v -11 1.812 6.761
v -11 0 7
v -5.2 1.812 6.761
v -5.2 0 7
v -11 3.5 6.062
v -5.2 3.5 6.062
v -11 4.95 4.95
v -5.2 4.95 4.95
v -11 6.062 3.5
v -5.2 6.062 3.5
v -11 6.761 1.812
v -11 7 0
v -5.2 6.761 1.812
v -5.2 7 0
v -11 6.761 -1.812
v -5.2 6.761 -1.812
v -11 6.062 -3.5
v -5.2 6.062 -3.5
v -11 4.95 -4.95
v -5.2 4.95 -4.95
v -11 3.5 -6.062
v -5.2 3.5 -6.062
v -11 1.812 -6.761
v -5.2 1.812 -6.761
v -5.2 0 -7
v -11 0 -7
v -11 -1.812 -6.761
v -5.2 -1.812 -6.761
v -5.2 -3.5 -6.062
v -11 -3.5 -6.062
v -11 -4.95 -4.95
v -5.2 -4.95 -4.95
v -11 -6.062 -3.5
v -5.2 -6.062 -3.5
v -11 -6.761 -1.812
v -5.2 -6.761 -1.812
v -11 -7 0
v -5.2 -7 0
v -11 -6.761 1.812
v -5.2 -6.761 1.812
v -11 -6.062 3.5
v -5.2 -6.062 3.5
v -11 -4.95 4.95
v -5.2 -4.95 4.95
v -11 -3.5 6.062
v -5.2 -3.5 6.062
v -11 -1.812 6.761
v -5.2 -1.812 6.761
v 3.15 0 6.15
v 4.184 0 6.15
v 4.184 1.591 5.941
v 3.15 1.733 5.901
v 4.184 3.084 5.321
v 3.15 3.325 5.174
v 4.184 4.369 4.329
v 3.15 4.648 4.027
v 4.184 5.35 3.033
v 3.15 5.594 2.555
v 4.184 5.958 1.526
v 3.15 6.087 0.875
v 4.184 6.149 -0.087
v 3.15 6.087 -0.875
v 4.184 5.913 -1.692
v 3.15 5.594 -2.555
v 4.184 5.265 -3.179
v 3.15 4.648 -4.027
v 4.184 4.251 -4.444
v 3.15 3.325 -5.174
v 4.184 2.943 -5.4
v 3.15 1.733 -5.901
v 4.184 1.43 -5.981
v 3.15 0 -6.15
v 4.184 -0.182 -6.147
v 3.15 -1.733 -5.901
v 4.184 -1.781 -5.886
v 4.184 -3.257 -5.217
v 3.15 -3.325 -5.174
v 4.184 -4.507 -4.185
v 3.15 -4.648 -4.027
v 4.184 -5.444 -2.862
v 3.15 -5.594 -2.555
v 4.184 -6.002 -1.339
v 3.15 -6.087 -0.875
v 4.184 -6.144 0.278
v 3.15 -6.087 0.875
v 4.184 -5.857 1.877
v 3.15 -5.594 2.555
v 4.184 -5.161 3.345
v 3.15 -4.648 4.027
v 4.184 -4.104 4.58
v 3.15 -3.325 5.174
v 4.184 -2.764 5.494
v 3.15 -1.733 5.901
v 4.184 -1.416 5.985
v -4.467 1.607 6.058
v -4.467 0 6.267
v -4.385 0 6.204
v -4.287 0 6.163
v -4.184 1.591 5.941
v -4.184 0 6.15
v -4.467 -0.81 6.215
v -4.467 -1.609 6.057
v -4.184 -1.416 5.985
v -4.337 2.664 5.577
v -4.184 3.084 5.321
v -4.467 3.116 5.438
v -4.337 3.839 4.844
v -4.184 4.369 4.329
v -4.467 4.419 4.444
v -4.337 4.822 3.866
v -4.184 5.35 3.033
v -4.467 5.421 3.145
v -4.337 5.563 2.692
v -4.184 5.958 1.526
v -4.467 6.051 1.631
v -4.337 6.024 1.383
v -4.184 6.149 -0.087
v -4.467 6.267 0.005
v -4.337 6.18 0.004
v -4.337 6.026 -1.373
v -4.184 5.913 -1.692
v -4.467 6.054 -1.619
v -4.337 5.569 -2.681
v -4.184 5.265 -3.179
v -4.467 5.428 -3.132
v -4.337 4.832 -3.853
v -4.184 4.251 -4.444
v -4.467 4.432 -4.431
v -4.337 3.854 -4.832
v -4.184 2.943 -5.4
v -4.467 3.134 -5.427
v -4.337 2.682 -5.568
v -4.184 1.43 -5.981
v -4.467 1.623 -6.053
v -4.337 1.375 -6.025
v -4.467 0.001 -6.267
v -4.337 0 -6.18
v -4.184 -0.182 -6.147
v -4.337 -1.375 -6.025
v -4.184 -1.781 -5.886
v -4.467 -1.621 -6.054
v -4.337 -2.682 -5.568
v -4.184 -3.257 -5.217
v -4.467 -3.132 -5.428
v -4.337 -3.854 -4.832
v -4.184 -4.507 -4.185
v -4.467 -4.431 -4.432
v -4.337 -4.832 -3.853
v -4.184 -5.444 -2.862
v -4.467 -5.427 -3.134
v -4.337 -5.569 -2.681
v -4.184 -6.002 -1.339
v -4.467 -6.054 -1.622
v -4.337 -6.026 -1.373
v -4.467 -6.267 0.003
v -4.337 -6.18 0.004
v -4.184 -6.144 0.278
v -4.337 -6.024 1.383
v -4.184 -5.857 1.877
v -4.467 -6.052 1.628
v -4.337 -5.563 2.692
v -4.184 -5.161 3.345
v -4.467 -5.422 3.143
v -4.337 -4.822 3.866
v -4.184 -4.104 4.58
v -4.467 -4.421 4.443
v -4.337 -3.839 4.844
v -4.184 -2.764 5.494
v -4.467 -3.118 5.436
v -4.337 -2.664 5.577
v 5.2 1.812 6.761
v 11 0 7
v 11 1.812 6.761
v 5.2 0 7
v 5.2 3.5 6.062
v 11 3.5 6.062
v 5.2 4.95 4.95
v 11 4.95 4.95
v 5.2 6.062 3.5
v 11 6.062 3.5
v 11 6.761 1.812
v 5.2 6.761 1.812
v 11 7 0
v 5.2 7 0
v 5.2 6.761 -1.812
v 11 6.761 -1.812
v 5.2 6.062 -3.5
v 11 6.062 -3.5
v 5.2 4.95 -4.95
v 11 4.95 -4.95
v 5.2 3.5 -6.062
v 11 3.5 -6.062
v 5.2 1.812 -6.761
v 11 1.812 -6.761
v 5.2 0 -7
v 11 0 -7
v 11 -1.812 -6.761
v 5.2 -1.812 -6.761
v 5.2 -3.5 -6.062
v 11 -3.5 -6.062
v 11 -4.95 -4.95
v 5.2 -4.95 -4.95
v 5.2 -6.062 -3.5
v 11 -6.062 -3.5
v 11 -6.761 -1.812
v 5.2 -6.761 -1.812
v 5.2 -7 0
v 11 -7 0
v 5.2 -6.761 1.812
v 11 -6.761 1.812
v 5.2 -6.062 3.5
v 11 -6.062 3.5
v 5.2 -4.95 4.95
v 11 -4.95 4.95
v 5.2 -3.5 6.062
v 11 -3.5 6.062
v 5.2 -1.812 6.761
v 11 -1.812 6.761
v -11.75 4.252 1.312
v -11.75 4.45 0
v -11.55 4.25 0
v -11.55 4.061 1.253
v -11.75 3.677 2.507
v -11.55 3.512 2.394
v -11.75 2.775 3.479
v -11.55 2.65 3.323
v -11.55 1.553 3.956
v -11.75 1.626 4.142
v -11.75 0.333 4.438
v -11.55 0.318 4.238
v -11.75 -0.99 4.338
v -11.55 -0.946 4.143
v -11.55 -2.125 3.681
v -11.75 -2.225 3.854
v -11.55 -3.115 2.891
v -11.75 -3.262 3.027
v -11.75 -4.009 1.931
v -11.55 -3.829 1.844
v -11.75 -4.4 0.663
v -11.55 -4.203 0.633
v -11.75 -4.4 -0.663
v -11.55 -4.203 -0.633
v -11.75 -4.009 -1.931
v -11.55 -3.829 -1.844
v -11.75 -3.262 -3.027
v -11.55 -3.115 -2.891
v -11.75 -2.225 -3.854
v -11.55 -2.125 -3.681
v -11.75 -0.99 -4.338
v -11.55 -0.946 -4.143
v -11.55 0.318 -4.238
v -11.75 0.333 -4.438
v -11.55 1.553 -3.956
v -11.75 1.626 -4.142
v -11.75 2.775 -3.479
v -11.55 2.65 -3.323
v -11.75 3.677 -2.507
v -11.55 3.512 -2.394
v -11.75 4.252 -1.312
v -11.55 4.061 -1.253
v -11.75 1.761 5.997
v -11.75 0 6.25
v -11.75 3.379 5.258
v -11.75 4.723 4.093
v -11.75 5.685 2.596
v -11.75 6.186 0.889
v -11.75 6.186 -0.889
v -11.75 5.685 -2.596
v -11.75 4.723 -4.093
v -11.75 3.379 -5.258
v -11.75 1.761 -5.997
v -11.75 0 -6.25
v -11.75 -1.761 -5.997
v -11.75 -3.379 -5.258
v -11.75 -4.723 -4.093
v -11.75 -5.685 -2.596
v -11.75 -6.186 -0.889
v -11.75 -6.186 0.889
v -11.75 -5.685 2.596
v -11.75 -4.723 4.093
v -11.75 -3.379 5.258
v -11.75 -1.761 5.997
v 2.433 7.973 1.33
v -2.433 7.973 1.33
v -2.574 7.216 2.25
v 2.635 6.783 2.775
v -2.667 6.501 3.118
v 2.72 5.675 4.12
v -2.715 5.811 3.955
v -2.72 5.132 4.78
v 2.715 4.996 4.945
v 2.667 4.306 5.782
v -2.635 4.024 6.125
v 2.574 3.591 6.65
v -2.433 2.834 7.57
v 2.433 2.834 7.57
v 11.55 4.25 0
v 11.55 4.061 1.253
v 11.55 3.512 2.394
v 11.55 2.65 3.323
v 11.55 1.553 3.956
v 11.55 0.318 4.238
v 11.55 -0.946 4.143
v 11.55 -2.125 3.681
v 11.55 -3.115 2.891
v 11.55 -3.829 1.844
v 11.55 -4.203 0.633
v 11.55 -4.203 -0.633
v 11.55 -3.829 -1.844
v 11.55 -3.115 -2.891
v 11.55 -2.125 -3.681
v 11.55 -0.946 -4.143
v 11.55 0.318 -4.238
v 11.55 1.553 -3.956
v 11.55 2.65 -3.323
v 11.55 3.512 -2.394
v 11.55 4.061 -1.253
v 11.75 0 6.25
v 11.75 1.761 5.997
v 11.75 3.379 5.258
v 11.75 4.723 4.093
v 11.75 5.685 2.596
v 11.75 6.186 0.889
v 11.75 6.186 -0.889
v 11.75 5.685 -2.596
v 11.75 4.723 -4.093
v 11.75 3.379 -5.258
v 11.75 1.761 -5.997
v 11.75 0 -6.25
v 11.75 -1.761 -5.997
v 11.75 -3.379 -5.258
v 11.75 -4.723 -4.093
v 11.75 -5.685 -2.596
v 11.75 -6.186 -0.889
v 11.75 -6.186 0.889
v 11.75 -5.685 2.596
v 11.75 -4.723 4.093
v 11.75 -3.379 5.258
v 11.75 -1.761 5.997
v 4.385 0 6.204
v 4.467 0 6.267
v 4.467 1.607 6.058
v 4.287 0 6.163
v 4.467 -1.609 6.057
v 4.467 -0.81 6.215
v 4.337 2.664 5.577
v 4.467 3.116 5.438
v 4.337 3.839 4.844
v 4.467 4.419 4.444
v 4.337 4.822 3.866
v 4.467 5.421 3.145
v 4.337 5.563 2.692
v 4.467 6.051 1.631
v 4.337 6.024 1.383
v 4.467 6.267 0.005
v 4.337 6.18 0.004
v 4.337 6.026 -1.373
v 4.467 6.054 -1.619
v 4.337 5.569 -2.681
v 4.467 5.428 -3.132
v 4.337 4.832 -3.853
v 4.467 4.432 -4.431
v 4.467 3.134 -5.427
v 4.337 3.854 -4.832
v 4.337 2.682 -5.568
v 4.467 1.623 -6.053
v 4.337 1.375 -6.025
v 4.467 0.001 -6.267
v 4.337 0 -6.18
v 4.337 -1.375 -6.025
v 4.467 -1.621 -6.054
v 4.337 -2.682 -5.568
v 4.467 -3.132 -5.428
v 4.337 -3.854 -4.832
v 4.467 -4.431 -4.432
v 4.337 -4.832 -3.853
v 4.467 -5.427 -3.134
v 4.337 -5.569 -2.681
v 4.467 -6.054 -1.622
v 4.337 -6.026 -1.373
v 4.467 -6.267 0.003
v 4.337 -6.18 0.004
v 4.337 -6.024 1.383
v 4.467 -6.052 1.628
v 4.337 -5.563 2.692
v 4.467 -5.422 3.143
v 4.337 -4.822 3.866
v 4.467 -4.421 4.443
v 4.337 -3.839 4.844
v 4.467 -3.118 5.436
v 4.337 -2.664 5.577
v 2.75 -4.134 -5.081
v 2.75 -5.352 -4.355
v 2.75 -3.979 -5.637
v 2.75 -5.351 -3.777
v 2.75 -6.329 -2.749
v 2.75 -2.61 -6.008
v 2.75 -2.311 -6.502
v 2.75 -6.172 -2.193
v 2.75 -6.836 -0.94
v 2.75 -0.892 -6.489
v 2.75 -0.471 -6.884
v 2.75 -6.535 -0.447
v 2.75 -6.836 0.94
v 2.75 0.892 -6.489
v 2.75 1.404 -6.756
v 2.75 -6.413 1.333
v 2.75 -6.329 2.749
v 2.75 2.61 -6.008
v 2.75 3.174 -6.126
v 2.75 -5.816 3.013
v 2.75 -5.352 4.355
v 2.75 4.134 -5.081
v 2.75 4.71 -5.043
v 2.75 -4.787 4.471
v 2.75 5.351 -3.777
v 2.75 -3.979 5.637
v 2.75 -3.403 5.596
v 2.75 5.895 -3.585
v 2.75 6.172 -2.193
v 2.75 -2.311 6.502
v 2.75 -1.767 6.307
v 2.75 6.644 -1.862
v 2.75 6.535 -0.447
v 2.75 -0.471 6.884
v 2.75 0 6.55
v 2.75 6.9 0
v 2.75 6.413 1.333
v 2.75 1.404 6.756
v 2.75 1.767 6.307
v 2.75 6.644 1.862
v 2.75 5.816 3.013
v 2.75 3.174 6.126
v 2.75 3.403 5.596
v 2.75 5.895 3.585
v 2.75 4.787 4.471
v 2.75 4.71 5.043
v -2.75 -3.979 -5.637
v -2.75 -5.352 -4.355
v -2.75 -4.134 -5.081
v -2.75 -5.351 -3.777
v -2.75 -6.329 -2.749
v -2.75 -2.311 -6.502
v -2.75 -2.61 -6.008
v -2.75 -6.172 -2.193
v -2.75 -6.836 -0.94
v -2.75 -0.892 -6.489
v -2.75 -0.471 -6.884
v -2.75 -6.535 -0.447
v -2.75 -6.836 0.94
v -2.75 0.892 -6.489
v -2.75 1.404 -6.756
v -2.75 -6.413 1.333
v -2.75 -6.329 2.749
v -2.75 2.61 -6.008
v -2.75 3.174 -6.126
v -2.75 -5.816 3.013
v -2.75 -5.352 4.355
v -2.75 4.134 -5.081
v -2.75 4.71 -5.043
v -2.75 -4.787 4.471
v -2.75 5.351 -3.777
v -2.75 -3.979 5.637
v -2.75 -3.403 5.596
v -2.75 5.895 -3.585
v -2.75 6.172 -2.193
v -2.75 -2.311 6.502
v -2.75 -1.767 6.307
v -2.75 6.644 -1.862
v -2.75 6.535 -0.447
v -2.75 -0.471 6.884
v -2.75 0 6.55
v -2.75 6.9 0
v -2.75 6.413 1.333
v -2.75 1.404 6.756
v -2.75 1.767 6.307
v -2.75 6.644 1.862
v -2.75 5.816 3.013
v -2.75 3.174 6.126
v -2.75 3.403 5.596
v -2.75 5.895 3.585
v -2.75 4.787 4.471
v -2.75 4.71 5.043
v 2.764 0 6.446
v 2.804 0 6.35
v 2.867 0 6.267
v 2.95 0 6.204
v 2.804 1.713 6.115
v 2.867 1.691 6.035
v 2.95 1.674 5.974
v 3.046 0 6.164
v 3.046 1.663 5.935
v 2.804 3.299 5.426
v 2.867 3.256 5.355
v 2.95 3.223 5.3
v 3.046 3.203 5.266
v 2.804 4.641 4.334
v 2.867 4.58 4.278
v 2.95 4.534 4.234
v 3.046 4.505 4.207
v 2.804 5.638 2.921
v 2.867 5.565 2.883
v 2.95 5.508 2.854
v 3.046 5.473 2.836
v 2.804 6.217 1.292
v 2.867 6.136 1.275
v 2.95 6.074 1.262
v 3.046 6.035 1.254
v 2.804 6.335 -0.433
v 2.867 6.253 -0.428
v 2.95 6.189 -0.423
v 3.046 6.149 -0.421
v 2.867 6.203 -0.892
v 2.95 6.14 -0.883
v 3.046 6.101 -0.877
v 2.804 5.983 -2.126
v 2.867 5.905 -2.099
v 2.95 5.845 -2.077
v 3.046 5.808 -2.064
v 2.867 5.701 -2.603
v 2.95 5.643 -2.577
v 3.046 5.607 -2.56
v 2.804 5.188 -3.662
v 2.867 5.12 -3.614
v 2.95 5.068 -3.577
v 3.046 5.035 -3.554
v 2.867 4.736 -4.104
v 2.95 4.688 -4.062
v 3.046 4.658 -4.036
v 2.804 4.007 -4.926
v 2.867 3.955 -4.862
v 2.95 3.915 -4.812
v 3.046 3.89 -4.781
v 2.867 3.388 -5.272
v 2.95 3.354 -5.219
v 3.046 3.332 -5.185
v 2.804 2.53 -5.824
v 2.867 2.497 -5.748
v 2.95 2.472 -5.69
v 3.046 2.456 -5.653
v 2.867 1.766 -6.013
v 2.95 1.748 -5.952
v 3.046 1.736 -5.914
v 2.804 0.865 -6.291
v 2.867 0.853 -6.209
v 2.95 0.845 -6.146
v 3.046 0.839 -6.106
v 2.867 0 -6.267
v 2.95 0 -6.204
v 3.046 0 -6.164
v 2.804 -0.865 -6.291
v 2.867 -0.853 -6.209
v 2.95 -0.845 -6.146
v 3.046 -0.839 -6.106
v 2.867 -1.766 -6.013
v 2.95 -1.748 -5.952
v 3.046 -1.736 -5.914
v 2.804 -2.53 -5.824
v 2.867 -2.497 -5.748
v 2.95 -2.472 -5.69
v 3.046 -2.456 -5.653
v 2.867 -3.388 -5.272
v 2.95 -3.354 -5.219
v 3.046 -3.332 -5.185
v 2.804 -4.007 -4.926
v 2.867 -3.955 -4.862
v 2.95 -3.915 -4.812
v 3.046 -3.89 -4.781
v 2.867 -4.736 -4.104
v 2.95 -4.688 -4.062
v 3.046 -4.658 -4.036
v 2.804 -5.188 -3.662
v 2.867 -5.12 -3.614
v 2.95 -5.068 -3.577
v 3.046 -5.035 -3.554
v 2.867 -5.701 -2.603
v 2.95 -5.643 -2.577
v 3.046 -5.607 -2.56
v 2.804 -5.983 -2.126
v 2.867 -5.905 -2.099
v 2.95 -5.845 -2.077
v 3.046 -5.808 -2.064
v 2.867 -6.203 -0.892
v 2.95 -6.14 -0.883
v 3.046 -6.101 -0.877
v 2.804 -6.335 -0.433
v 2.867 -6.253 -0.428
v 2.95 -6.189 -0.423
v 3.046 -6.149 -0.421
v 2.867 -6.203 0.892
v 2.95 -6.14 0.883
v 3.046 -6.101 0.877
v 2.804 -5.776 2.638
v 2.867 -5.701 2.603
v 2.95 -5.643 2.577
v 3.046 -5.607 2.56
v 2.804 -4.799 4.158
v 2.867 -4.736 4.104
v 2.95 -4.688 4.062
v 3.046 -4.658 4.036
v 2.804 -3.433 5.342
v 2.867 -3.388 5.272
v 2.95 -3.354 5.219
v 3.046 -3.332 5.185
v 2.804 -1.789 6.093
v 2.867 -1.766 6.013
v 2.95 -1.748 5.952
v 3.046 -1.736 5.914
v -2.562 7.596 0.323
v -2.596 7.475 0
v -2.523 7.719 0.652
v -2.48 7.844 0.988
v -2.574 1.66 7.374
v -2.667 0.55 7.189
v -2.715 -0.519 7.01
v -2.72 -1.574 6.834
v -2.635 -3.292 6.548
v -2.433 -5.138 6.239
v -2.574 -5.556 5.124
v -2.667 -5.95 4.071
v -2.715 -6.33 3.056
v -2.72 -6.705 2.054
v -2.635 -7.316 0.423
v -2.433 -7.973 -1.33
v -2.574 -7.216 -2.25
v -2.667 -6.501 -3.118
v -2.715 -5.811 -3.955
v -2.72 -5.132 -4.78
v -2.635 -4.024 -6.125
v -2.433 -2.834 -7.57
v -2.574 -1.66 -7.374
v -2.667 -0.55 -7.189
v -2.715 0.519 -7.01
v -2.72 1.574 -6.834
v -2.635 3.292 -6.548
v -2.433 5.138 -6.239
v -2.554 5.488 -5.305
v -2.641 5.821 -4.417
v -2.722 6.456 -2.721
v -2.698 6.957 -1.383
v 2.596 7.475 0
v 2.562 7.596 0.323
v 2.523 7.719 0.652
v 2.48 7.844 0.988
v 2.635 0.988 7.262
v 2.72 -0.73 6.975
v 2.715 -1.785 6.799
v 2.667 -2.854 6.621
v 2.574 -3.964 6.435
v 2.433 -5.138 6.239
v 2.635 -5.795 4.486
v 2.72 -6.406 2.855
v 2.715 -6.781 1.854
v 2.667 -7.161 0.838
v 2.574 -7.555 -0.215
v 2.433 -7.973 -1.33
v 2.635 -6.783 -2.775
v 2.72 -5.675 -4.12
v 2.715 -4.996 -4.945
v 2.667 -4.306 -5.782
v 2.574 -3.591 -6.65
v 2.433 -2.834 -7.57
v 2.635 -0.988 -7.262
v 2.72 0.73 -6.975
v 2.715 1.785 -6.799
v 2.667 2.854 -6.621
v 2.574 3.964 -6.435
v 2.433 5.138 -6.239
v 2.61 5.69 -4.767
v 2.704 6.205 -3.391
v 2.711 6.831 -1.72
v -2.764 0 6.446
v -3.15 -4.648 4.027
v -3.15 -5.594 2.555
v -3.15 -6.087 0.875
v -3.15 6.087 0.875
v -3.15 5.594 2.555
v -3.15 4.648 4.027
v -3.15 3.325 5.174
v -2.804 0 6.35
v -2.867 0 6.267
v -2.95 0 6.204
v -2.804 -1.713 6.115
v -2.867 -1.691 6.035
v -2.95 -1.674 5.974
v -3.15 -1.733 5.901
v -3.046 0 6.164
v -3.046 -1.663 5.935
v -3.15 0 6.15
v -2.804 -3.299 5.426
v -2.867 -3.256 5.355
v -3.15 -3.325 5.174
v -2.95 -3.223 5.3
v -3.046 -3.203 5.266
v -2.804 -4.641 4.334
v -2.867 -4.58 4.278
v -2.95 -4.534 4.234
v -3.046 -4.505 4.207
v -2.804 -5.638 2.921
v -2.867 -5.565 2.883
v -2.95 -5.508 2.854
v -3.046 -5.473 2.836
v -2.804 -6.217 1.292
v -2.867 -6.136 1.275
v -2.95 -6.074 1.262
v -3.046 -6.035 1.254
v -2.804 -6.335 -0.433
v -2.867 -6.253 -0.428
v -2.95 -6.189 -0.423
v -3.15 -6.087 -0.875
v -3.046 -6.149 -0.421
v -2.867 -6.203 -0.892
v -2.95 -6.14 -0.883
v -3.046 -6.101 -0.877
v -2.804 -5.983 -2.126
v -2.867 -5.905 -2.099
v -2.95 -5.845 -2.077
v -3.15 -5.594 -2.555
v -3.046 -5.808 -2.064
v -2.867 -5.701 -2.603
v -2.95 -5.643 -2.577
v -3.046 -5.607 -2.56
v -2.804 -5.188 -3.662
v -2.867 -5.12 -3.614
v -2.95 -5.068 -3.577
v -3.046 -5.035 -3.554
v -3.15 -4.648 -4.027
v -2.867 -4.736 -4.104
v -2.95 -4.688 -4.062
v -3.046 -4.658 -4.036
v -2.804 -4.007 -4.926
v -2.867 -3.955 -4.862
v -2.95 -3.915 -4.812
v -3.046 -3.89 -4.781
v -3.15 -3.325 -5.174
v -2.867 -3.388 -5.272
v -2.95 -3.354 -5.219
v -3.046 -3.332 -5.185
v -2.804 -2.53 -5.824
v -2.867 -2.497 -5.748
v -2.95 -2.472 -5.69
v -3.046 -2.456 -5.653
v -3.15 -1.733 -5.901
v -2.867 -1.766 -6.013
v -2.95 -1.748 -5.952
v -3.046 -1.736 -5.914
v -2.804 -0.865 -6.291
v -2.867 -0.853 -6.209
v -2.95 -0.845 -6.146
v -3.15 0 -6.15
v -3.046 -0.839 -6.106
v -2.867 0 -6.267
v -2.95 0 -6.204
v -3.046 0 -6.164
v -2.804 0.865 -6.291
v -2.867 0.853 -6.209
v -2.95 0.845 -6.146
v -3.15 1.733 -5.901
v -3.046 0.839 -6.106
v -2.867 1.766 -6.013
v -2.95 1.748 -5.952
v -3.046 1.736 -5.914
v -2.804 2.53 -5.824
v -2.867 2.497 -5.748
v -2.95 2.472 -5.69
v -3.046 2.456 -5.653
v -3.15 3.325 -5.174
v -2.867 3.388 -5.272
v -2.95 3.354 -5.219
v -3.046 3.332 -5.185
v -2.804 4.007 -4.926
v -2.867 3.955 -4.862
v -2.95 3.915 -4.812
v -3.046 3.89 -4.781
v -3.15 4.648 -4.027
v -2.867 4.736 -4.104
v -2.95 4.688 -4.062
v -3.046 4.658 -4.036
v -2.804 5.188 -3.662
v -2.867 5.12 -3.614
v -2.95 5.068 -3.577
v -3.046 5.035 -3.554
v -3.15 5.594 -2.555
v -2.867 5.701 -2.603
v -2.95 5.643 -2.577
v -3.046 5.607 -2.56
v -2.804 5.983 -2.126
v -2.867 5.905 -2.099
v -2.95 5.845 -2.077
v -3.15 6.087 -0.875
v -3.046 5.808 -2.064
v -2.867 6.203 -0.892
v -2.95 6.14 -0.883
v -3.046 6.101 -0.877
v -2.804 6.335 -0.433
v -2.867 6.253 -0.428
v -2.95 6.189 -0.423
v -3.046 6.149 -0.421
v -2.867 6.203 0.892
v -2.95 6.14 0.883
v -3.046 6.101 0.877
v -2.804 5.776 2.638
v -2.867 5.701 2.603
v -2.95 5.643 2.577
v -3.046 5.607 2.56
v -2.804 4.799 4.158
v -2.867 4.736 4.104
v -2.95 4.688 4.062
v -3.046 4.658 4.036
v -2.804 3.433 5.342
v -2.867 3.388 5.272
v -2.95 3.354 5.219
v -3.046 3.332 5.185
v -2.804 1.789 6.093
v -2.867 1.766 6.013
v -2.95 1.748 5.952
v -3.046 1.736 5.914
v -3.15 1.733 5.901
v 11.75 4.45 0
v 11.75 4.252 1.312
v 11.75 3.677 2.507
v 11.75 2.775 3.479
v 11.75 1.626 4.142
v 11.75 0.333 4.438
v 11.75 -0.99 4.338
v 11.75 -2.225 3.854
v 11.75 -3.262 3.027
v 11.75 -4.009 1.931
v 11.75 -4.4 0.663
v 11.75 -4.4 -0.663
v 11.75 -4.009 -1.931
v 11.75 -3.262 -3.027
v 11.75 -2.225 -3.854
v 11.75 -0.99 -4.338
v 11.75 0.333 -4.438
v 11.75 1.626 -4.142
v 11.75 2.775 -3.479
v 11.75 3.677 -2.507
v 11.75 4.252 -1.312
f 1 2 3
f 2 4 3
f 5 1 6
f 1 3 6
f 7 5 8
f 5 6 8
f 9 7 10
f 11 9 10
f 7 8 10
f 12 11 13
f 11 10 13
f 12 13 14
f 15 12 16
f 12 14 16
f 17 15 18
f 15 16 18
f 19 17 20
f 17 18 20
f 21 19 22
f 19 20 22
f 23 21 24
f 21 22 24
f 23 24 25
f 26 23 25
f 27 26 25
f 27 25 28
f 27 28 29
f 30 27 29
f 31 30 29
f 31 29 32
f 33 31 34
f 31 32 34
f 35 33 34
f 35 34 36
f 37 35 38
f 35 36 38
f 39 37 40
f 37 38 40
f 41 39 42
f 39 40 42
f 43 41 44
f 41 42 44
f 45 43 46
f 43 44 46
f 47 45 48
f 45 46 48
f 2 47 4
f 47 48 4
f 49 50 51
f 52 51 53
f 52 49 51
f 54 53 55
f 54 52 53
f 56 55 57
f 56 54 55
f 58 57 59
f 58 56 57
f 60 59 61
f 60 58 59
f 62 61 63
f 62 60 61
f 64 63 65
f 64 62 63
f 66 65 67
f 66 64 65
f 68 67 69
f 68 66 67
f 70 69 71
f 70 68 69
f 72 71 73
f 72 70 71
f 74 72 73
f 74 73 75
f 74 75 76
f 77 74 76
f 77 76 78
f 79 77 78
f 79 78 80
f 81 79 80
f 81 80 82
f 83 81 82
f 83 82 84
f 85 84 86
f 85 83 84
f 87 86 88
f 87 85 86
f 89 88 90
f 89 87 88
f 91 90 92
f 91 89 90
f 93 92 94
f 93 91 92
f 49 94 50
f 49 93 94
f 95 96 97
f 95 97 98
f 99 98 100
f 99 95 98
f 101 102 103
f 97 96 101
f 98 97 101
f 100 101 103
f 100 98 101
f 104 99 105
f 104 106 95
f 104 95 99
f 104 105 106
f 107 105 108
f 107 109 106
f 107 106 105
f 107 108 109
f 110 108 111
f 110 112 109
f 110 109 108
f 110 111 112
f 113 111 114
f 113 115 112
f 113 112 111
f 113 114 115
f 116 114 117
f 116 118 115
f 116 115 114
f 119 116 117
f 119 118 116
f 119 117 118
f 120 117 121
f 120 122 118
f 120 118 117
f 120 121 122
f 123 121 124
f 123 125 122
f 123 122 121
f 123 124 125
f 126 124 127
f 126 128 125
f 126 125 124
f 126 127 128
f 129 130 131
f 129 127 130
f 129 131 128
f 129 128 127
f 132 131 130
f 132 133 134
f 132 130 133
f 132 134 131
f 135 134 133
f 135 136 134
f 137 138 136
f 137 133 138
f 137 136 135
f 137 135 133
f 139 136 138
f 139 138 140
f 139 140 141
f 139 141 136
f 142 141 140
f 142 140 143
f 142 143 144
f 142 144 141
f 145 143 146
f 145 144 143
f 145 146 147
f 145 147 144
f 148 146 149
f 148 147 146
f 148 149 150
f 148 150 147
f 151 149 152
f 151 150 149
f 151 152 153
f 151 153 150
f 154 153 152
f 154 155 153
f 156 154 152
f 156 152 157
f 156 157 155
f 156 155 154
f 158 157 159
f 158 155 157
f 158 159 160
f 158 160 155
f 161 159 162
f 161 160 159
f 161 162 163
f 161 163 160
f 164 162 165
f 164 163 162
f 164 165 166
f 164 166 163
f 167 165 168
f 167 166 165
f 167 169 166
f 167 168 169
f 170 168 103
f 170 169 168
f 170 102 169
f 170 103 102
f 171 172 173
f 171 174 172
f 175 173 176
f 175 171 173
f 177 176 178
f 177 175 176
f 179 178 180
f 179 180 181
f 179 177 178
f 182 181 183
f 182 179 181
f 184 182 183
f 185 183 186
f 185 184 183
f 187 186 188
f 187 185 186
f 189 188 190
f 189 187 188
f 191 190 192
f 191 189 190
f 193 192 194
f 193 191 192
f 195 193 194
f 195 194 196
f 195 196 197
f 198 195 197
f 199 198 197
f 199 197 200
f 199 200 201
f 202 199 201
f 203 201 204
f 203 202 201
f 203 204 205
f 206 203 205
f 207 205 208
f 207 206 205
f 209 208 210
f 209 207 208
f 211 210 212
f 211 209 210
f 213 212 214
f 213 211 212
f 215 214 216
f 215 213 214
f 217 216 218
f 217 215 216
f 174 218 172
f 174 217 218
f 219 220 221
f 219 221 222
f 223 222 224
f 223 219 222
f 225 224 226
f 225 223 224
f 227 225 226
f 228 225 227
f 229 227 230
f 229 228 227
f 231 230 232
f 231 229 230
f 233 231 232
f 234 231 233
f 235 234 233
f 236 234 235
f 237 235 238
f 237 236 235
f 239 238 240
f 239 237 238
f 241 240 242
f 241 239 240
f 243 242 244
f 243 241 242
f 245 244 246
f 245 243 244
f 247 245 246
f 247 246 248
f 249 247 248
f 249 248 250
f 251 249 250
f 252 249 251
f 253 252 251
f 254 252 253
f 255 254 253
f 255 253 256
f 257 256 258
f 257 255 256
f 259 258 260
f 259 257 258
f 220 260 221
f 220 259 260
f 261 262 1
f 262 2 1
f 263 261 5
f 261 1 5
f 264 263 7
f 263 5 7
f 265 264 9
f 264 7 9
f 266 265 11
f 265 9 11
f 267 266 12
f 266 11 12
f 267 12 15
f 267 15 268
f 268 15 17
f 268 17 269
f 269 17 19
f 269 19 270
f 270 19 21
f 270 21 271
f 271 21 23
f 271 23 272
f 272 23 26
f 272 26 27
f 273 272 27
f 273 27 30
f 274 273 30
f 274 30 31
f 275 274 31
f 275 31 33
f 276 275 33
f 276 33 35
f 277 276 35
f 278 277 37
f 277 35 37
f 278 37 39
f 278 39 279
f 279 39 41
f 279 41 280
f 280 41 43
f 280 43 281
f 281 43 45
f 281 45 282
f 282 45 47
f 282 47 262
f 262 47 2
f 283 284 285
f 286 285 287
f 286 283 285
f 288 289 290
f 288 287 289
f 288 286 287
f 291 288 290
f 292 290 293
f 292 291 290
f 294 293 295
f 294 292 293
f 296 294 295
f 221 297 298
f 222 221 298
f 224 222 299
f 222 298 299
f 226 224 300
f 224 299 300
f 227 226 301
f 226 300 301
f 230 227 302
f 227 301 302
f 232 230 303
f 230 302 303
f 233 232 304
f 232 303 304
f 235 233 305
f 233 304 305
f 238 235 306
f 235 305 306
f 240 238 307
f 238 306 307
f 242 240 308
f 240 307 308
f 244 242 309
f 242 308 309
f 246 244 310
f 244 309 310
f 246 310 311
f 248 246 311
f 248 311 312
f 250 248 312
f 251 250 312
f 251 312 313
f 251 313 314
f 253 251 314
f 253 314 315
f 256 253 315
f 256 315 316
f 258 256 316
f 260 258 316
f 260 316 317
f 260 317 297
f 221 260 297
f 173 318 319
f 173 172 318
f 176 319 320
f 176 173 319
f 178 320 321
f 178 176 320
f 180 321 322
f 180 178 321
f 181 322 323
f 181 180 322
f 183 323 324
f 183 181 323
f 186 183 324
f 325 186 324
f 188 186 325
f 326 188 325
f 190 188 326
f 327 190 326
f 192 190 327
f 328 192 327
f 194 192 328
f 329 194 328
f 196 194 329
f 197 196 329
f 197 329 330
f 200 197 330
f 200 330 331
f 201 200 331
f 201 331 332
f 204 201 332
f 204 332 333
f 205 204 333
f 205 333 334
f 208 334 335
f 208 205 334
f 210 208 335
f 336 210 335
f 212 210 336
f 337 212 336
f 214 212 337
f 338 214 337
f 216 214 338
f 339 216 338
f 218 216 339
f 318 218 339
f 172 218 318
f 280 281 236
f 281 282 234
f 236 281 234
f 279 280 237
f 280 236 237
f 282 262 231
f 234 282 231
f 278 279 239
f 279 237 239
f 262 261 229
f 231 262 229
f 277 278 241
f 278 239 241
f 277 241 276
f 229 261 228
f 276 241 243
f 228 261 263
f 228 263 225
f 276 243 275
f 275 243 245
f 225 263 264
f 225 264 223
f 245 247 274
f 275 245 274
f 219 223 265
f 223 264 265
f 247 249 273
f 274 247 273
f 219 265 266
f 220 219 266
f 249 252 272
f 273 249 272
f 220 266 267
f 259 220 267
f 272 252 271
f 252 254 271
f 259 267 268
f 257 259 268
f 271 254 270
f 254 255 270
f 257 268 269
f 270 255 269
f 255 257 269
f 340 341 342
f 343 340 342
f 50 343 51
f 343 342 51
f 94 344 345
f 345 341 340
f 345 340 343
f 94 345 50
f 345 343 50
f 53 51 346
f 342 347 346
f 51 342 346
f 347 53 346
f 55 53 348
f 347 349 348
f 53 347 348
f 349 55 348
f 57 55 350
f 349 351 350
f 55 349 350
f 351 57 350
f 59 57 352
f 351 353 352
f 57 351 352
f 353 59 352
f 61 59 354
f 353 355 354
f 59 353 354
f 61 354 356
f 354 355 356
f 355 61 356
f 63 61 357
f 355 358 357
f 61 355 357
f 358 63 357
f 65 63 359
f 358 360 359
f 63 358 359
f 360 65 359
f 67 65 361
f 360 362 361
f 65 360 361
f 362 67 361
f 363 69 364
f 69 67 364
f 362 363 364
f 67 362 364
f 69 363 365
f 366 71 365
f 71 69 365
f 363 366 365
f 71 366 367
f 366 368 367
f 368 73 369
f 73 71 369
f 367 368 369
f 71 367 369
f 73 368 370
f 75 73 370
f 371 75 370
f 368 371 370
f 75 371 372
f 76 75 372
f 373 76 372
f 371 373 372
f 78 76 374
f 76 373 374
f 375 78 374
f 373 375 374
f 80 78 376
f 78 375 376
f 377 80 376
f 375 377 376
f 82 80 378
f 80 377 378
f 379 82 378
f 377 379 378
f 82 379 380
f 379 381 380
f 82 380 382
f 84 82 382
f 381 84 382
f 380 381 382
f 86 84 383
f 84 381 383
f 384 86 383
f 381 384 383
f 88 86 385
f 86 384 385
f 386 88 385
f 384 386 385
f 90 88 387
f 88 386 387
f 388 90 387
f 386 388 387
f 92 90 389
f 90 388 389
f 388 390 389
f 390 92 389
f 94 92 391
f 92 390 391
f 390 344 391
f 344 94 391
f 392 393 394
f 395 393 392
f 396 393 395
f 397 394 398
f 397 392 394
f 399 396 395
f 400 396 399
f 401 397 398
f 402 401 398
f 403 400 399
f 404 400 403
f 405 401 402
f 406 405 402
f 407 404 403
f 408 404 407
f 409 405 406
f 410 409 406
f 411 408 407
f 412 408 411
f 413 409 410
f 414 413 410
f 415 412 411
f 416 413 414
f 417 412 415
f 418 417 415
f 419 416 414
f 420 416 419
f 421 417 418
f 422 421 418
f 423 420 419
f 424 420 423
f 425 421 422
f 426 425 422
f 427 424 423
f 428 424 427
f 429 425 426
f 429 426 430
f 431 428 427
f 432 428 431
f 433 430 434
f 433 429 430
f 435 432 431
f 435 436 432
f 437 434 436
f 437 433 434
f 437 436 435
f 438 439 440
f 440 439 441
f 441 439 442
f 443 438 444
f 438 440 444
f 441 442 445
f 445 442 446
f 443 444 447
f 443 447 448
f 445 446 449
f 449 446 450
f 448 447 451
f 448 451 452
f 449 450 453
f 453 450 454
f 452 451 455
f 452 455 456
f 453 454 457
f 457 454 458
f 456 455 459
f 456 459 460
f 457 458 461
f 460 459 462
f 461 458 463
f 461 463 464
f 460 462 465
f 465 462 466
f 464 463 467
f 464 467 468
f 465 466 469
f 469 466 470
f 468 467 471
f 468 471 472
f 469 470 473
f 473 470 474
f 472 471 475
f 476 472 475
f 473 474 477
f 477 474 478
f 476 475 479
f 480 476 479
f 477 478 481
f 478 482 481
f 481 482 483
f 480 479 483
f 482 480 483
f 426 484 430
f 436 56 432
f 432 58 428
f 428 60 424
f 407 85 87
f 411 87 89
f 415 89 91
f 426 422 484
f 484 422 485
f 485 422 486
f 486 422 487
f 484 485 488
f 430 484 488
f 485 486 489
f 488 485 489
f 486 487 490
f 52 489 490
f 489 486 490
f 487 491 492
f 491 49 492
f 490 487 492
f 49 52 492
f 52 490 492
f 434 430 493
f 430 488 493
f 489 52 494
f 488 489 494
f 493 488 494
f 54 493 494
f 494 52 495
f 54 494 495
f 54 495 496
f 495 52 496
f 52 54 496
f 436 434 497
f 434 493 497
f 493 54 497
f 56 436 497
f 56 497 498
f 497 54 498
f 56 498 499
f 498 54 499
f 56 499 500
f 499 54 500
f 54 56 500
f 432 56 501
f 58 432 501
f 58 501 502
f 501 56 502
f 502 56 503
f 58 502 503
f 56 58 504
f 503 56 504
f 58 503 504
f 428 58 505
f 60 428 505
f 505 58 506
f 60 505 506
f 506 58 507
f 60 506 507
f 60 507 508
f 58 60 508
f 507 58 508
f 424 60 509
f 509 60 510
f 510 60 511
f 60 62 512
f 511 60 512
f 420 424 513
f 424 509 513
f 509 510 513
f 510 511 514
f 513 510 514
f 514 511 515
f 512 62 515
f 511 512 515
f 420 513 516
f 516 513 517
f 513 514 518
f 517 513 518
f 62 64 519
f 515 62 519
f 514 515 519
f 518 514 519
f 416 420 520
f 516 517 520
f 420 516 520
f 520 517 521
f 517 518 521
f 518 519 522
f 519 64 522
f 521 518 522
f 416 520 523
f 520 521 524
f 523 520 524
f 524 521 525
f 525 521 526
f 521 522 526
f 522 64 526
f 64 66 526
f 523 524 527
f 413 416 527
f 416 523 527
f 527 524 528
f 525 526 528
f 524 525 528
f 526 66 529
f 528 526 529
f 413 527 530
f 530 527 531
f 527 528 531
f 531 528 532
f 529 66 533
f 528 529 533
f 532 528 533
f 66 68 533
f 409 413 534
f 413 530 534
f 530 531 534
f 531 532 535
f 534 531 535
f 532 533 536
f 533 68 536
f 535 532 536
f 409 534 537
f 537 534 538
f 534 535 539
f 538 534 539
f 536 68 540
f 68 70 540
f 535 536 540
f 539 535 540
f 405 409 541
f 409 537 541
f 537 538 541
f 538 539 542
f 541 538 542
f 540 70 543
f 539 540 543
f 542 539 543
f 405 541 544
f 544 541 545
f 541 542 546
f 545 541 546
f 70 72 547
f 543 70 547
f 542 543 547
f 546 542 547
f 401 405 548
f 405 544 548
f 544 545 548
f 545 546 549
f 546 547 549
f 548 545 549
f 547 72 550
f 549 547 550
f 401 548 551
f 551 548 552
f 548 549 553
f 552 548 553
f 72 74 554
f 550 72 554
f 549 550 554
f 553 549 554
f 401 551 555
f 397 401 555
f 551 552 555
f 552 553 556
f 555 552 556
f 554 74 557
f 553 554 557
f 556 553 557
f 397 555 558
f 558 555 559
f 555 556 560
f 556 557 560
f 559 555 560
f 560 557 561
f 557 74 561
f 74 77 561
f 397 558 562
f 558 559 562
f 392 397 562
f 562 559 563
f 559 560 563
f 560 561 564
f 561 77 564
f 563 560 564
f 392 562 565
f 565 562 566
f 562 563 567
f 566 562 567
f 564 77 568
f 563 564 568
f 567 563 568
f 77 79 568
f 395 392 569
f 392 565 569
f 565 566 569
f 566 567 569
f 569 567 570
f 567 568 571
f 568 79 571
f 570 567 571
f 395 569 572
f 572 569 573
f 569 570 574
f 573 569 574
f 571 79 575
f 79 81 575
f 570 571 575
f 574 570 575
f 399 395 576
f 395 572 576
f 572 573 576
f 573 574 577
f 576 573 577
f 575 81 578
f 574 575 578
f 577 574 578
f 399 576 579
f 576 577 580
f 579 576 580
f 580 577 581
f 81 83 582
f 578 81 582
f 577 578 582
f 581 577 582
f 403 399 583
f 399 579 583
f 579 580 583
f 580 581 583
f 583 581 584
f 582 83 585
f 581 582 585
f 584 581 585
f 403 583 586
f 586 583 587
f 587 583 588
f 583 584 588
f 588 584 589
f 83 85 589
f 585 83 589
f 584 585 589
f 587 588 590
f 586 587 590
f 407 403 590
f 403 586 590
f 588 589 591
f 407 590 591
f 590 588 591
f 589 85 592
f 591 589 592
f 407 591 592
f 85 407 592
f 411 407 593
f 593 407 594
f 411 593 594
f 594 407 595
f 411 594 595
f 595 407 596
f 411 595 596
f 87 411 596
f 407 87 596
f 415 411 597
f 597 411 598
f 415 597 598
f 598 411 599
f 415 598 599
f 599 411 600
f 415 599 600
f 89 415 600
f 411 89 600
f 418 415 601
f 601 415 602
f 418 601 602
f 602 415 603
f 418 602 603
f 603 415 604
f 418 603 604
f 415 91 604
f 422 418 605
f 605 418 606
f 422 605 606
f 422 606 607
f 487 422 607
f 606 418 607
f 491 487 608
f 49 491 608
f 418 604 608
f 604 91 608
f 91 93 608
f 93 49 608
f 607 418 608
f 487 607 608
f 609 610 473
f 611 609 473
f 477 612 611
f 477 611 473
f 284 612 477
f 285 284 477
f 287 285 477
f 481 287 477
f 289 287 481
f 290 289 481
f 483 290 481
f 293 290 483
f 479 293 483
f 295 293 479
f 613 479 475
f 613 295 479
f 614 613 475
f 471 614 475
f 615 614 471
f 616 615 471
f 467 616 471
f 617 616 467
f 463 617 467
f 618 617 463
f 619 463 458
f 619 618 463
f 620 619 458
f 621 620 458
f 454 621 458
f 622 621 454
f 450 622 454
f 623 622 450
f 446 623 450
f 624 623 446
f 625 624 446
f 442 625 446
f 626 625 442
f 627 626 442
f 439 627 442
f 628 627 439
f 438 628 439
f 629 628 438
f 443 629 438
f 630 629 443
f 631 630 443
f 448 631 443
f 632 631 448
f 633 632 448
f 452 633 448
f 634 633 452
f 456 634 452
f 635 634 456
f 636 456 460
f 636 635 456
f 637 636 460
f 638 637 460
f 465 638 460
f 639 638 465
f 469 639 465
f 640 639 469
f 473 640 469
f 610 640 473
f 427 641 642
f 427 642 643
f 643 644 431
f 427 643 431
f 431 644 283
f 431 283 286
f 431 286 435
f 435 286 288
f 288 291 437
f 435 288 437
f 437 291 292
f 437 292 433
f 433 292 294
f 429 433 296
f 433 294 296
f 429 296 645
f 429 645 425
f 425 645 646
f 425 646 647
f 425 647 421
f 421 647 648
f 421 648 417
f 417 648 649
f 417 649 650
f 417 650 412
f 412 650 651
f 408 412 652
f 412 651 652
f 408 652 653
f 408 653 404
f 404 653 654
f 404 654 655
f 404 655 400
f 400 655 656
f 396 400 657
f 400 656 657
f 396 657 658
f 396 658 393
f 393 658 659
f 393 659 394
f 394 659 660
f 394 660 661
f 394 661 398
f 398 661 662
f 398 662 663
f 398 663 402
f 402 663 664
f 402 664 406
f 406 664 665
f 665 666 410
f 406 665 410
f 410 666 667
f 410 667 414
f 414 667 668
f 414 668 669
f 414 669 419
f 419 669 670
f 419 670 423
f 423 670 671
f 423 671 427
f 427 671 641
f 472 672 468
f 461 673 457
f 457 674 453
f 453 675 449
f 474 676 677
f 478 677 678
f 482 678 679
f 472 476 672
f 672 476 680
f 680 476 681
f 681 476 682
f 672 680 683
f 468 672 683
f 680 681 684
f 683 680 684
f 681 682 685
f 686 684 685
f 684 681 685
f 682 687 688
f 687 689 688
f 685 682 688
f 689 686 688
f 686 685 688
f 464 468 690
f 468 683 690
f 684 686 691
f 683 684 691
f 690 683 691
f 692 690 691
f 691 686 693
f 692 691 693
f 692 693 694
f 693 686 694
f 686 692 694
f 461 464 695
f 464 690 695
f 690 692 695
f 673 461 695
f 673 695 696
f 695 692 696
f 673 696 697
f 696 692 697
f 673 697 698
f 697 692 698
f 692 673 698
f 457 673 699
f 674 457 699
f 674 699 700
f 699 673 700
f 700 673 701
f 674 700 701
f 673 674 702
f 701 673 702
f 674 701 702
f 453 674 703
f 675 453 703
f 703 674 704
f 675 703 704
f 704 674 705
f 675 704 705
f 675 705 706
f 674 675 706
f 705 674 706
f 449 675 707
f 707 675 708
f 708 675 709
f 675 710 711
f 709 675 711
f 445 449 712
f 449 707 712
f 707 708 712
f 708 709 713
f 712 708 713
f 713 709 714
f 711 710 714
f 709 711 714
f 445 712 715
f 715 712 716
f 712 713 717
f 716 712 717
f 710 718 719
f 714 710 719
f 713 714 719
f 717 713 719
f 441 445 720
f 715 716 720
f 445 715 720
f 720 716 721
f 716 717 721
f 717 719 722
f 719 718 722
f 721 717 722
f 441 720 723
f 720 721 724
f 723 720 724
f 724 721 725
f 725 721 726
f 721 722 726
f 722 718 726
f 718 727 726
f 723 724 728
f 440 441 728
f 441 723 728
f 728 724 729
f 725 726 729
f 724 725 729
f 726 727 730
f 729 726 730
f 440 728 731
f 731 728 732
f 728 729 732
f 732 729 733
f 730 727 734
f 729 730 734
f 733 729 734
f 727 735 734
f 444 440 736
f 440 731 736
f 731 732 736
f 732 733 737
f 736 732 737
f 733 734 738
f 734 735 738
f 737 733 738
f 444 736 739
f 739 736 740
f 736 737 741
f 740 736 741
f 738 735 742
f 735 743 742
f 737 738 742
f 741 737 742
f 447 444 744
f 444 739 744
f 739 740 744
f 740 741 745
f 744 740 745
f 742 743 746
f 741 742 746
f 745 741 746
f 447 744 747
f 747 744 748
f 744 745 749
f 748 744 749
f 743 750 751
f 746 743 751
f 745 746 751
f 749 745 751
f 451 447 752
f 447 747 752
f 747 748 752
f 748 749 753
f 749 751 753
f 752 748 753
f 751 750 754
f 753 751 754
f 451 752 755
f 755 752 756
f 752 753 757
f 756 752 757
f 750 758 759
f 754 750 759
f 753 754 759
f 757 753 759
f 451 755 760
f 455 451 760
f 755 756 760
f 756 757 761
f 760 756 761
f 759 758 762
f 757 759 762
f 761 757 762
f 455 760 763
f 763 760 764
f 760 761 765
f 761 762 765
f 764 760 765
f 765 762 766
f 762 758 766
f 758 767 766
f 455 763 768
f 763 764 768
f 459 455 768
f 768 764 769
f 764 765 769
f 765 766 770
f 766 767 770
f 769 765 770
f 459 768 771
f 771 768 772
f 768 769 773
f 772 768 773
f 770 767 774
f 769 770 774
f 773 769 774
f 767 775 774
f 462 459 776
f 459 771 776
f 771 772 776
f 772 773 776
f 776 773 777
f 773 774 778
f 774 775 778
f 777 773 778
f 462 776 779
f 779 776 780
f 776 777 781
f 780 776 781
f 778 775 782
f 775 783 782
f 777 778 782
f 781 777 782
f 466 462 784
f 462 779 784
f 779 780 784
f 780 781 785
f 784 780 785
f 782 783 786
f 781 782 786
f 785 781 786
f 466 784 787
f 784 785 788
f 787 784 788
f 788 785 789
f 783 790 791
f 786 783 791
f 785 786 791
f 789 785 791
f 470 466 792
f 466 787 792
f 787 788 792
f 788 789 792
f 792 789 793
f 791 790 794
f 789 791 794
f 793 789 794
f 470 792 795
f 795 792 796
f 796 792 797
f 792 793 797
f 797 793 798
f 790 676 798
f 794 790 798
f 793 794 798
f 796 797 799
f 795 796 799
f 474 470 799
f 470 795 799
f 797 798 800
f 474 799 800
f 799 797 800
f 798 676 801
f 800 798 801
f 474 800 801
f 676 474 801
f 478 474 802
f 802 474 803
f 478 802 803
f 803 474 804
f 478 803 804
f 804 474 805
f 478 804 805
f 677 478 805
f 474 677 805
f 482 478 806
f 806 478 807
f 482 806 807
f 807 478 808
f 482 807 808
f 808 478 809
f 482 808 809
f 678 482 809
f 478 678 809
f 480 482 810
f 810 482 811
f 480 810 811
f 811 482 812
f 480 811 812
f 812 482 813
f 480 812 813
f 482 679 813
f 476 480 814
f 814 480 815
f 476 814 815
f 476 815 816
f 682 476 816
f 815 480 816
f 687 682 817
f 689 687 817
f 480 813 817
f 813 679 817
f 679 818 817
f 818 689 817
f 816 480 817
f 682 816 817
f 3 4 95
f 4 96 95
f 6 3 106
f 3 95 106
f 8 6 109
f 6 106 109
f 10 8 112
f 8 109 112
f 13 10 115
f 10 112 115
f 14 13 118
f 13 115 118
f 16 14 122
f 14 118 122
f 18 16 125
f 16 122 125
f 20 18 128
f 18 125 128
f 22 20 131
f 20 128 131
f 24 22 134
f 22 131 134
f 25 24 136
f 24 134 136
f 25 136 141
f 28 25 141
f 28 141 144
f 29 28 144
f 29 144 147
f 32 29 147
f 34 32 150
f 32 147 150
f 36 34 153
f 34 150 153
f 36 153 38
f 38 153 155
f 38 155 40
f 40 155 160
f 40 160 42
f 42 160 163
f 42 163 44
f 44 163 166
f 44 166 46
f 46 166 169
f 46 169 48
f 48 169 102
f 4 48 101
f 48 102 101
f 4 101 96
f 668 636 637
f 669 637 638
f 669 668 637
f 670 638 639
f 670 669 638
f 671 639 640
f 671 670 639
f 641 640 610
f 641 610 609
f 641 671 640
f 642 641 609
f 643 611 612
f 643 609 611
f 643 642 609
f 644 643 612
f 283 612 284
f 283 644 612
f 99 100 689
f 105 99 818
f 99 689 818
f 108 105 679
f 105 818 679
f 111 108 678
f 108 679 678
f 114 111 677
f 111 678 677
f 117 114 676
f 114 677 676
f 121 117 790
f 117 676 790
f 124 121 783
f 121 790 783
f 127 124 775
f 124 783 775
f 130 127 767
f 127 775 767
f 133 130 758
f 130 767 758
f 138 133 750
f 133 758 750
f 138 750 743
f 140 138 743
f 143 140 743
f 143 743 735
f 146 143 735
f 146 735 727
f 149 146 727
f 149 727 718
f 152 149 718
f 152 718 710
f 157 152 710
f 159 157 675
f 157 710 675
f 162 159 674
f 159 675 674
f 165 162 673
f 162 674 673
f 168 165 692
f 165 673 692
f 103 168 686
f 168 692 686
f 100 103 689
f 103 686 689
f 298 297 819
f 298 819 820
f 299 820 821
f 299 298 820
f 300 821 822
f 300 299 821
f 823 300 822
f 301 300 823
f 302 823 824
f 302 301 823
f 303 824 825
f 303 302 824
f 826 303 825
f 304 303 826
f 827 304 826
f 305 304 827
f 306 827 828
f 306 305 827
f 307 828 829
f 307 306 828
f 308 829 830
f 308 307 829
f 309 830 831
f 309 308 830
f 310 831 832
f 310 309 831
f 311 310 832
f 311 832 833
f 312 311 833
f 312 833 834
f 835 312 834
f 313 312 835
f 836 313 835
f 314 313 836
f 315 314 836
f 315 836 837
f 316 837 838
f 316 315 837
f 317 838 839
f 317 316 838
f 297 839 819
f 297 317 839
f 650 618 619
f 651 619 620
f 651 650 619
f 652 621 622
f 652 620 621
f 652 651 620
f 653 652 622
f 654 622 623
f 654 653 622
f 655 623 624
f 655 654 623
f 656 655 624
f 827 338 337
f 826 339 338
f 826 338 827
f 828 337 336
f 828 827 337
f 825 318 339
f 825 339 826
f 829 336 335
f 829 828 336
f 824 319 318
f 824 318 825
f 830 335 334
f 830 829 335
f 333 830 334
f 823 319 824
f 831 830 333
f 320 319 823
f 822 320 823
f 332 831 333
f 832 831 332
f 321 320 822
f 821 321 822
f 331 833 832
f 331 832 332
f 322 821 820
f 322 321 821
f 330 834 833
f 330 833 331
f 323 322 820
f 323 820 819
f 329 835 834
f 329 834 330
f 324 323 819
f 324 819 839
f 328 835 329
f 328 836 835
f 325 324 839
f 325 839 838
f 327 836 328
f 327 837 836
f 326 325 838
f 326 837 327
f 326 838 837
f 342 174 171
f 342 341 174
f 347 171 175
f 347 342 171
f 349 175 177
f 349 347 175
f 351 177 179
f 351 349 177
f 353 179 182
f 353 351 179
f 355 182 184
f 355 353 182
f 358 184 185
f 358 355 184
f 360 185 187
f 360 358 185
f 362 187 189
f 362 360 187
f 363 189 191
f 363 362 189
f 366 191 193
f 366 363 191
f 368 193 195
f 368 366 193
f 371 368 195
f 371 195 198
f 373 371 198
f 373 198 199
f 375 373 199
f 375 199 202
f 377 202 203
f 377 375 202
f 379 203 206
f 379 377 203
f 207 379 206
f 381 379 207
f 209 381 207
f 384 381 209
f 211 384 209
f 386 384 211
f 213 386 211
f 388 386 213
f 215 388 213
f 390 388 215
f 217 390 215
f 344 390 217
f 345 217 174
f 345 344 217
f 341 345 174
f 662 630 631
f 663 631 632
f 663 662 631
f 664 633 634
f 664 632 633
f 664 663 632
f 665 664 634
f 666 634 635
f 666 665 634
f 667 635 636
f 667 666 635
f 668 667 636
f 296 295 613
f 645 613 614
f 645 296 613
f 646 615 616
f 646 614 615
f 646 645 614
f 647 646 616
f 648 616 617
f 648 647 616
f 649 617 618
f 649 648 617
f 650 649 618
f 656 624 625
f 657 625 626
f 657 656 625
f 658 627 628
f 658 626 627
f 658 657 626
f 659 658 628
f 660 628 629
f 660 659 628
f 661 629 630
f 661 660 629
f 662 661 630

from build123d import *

# Parameters (mm, degrees)
F2_SIZE2       = 0.75
F2_SIZE        = 0.75
F3_R           = 0.4
F7_DEPTH       = 2.75
F7_DEPTH_BACK  = 2.75
F8_R           = 0.4
F13_R          = 4.25
F14_DEPTH      = 25
F14_DEPTH_BACK = 44
F15_SIZE2      = 0.2
F15_SIZE       = 0.2


# Not quite as in the source:
# - an extrude ends at something that could not be found from the text; its depth is read off the source's solid


with BuildPart() as f1:
    # F0 (on Front) → F1 (revolve)
    with BuildSketch(Plane.XZ):
        Polygon((0, 6.15), (0, 0), (11.75, 0), (11.75, 7), (5.2, 7), (4.35, 6.15), (2.75, 6.15), align=None)
    revolve(axis=Axis((5.875, 0, 0), (-1, 0, 0)))

    # F2
    f2_edges = [f1.edges().sort_by_distance(p)[0] for p in [
        (11.75, 0, -7),
    ]]
    chamfer(f2_edges, length=F2_SIZE, length2=F2_SIZE2)

    # F3
    f3_edges = [f1.edges().sort_by_distance(p)[0] for p in [
        (4.35, 0, -6.15),
    ]]
    fillet(f3_edges, radius=F3_R)

    # F4: F1 across plane


with BuildPart() as f1_1:
    add(f1.part)
    add(f1.part.mirror(Plane.XZ))

    # F5: F1 across plane


with BuildPart() as f1_2:
    add(f1_1.part)
    add(f1_1.part.mirror(Plane.YZ))

    # F6 (on Right) → F7 (join, two sides)
    with BuildSketch(Plane.YZ) as f7_sk:
        Polygon((2.834367898, 7.5696559996), (-5.1383304446, 6.2394626031), (-7.9726983425, -1.3301933965), (-2.834367898, -7.5696559996), (5.1383304446, -6.2394626031), (7.9726983425, 1.3301933965), align=None)
    extrude(amount=F7_DEPTH)
    extrude(f7_sk.sketch, amount=-F7_DEPTH_BACK)

    # F8
    f8_edges = [f1_2.edges().sort_by_distance(p)[0] for p in [
        (-2.75, 0, -6.15),
        (2.75, 0, -6.15),
    ]]
    fillet(f8_edges, radius=F8_R)


with BuildPart() as f10:
    # F9 (on Top) → F10 (revolve)
    with BuildSketch(Plane.XY):
        Polygon((-5.5153914727, 9.7084684995), (-2.75, 6.9), (-1.9974731336, 9.7084684995), align=None)
    revolve(axis=Axis((-5.9099821374, 0, 0), (1, 0, 0)))


with BuildPart() as f11_1:
    # F11: instance of F10
    add(f10.part.mirror(Plane.YZ))


with BuildPart() as f1_3:
    add(f1_2.part)

    # F12: cut F10, F11_1
    add(f10.part, mode=Mode.SUBTRACT)
    add(f11_1.part, mode=Mode.SUBTRACT)

    # F13 (on face) → F14 (cut, two sides)
    with BuildSketch(Plane.YZ.offset(11.75)) as f14_sk:
        Circle(F13_R)
    extrude(amount=-F14_DEPTH, mode=Mode.SUBTRACT)
    extrude(f14_sk.sketch, amount=F14_DEPTH_BACK, mode=Mode.SUBTRACT)

    # F15
    f15_edges = [f1_3.edges().sort_by_distance(p)[0] for p in [
        (11.75, -4.25, 0),
        (-11.75, -4.25, 0),
    ]]
    chamfer(f15_edges, length=F15_SIZE, length2=F15_SIZE2)


solid = f1_3.part
